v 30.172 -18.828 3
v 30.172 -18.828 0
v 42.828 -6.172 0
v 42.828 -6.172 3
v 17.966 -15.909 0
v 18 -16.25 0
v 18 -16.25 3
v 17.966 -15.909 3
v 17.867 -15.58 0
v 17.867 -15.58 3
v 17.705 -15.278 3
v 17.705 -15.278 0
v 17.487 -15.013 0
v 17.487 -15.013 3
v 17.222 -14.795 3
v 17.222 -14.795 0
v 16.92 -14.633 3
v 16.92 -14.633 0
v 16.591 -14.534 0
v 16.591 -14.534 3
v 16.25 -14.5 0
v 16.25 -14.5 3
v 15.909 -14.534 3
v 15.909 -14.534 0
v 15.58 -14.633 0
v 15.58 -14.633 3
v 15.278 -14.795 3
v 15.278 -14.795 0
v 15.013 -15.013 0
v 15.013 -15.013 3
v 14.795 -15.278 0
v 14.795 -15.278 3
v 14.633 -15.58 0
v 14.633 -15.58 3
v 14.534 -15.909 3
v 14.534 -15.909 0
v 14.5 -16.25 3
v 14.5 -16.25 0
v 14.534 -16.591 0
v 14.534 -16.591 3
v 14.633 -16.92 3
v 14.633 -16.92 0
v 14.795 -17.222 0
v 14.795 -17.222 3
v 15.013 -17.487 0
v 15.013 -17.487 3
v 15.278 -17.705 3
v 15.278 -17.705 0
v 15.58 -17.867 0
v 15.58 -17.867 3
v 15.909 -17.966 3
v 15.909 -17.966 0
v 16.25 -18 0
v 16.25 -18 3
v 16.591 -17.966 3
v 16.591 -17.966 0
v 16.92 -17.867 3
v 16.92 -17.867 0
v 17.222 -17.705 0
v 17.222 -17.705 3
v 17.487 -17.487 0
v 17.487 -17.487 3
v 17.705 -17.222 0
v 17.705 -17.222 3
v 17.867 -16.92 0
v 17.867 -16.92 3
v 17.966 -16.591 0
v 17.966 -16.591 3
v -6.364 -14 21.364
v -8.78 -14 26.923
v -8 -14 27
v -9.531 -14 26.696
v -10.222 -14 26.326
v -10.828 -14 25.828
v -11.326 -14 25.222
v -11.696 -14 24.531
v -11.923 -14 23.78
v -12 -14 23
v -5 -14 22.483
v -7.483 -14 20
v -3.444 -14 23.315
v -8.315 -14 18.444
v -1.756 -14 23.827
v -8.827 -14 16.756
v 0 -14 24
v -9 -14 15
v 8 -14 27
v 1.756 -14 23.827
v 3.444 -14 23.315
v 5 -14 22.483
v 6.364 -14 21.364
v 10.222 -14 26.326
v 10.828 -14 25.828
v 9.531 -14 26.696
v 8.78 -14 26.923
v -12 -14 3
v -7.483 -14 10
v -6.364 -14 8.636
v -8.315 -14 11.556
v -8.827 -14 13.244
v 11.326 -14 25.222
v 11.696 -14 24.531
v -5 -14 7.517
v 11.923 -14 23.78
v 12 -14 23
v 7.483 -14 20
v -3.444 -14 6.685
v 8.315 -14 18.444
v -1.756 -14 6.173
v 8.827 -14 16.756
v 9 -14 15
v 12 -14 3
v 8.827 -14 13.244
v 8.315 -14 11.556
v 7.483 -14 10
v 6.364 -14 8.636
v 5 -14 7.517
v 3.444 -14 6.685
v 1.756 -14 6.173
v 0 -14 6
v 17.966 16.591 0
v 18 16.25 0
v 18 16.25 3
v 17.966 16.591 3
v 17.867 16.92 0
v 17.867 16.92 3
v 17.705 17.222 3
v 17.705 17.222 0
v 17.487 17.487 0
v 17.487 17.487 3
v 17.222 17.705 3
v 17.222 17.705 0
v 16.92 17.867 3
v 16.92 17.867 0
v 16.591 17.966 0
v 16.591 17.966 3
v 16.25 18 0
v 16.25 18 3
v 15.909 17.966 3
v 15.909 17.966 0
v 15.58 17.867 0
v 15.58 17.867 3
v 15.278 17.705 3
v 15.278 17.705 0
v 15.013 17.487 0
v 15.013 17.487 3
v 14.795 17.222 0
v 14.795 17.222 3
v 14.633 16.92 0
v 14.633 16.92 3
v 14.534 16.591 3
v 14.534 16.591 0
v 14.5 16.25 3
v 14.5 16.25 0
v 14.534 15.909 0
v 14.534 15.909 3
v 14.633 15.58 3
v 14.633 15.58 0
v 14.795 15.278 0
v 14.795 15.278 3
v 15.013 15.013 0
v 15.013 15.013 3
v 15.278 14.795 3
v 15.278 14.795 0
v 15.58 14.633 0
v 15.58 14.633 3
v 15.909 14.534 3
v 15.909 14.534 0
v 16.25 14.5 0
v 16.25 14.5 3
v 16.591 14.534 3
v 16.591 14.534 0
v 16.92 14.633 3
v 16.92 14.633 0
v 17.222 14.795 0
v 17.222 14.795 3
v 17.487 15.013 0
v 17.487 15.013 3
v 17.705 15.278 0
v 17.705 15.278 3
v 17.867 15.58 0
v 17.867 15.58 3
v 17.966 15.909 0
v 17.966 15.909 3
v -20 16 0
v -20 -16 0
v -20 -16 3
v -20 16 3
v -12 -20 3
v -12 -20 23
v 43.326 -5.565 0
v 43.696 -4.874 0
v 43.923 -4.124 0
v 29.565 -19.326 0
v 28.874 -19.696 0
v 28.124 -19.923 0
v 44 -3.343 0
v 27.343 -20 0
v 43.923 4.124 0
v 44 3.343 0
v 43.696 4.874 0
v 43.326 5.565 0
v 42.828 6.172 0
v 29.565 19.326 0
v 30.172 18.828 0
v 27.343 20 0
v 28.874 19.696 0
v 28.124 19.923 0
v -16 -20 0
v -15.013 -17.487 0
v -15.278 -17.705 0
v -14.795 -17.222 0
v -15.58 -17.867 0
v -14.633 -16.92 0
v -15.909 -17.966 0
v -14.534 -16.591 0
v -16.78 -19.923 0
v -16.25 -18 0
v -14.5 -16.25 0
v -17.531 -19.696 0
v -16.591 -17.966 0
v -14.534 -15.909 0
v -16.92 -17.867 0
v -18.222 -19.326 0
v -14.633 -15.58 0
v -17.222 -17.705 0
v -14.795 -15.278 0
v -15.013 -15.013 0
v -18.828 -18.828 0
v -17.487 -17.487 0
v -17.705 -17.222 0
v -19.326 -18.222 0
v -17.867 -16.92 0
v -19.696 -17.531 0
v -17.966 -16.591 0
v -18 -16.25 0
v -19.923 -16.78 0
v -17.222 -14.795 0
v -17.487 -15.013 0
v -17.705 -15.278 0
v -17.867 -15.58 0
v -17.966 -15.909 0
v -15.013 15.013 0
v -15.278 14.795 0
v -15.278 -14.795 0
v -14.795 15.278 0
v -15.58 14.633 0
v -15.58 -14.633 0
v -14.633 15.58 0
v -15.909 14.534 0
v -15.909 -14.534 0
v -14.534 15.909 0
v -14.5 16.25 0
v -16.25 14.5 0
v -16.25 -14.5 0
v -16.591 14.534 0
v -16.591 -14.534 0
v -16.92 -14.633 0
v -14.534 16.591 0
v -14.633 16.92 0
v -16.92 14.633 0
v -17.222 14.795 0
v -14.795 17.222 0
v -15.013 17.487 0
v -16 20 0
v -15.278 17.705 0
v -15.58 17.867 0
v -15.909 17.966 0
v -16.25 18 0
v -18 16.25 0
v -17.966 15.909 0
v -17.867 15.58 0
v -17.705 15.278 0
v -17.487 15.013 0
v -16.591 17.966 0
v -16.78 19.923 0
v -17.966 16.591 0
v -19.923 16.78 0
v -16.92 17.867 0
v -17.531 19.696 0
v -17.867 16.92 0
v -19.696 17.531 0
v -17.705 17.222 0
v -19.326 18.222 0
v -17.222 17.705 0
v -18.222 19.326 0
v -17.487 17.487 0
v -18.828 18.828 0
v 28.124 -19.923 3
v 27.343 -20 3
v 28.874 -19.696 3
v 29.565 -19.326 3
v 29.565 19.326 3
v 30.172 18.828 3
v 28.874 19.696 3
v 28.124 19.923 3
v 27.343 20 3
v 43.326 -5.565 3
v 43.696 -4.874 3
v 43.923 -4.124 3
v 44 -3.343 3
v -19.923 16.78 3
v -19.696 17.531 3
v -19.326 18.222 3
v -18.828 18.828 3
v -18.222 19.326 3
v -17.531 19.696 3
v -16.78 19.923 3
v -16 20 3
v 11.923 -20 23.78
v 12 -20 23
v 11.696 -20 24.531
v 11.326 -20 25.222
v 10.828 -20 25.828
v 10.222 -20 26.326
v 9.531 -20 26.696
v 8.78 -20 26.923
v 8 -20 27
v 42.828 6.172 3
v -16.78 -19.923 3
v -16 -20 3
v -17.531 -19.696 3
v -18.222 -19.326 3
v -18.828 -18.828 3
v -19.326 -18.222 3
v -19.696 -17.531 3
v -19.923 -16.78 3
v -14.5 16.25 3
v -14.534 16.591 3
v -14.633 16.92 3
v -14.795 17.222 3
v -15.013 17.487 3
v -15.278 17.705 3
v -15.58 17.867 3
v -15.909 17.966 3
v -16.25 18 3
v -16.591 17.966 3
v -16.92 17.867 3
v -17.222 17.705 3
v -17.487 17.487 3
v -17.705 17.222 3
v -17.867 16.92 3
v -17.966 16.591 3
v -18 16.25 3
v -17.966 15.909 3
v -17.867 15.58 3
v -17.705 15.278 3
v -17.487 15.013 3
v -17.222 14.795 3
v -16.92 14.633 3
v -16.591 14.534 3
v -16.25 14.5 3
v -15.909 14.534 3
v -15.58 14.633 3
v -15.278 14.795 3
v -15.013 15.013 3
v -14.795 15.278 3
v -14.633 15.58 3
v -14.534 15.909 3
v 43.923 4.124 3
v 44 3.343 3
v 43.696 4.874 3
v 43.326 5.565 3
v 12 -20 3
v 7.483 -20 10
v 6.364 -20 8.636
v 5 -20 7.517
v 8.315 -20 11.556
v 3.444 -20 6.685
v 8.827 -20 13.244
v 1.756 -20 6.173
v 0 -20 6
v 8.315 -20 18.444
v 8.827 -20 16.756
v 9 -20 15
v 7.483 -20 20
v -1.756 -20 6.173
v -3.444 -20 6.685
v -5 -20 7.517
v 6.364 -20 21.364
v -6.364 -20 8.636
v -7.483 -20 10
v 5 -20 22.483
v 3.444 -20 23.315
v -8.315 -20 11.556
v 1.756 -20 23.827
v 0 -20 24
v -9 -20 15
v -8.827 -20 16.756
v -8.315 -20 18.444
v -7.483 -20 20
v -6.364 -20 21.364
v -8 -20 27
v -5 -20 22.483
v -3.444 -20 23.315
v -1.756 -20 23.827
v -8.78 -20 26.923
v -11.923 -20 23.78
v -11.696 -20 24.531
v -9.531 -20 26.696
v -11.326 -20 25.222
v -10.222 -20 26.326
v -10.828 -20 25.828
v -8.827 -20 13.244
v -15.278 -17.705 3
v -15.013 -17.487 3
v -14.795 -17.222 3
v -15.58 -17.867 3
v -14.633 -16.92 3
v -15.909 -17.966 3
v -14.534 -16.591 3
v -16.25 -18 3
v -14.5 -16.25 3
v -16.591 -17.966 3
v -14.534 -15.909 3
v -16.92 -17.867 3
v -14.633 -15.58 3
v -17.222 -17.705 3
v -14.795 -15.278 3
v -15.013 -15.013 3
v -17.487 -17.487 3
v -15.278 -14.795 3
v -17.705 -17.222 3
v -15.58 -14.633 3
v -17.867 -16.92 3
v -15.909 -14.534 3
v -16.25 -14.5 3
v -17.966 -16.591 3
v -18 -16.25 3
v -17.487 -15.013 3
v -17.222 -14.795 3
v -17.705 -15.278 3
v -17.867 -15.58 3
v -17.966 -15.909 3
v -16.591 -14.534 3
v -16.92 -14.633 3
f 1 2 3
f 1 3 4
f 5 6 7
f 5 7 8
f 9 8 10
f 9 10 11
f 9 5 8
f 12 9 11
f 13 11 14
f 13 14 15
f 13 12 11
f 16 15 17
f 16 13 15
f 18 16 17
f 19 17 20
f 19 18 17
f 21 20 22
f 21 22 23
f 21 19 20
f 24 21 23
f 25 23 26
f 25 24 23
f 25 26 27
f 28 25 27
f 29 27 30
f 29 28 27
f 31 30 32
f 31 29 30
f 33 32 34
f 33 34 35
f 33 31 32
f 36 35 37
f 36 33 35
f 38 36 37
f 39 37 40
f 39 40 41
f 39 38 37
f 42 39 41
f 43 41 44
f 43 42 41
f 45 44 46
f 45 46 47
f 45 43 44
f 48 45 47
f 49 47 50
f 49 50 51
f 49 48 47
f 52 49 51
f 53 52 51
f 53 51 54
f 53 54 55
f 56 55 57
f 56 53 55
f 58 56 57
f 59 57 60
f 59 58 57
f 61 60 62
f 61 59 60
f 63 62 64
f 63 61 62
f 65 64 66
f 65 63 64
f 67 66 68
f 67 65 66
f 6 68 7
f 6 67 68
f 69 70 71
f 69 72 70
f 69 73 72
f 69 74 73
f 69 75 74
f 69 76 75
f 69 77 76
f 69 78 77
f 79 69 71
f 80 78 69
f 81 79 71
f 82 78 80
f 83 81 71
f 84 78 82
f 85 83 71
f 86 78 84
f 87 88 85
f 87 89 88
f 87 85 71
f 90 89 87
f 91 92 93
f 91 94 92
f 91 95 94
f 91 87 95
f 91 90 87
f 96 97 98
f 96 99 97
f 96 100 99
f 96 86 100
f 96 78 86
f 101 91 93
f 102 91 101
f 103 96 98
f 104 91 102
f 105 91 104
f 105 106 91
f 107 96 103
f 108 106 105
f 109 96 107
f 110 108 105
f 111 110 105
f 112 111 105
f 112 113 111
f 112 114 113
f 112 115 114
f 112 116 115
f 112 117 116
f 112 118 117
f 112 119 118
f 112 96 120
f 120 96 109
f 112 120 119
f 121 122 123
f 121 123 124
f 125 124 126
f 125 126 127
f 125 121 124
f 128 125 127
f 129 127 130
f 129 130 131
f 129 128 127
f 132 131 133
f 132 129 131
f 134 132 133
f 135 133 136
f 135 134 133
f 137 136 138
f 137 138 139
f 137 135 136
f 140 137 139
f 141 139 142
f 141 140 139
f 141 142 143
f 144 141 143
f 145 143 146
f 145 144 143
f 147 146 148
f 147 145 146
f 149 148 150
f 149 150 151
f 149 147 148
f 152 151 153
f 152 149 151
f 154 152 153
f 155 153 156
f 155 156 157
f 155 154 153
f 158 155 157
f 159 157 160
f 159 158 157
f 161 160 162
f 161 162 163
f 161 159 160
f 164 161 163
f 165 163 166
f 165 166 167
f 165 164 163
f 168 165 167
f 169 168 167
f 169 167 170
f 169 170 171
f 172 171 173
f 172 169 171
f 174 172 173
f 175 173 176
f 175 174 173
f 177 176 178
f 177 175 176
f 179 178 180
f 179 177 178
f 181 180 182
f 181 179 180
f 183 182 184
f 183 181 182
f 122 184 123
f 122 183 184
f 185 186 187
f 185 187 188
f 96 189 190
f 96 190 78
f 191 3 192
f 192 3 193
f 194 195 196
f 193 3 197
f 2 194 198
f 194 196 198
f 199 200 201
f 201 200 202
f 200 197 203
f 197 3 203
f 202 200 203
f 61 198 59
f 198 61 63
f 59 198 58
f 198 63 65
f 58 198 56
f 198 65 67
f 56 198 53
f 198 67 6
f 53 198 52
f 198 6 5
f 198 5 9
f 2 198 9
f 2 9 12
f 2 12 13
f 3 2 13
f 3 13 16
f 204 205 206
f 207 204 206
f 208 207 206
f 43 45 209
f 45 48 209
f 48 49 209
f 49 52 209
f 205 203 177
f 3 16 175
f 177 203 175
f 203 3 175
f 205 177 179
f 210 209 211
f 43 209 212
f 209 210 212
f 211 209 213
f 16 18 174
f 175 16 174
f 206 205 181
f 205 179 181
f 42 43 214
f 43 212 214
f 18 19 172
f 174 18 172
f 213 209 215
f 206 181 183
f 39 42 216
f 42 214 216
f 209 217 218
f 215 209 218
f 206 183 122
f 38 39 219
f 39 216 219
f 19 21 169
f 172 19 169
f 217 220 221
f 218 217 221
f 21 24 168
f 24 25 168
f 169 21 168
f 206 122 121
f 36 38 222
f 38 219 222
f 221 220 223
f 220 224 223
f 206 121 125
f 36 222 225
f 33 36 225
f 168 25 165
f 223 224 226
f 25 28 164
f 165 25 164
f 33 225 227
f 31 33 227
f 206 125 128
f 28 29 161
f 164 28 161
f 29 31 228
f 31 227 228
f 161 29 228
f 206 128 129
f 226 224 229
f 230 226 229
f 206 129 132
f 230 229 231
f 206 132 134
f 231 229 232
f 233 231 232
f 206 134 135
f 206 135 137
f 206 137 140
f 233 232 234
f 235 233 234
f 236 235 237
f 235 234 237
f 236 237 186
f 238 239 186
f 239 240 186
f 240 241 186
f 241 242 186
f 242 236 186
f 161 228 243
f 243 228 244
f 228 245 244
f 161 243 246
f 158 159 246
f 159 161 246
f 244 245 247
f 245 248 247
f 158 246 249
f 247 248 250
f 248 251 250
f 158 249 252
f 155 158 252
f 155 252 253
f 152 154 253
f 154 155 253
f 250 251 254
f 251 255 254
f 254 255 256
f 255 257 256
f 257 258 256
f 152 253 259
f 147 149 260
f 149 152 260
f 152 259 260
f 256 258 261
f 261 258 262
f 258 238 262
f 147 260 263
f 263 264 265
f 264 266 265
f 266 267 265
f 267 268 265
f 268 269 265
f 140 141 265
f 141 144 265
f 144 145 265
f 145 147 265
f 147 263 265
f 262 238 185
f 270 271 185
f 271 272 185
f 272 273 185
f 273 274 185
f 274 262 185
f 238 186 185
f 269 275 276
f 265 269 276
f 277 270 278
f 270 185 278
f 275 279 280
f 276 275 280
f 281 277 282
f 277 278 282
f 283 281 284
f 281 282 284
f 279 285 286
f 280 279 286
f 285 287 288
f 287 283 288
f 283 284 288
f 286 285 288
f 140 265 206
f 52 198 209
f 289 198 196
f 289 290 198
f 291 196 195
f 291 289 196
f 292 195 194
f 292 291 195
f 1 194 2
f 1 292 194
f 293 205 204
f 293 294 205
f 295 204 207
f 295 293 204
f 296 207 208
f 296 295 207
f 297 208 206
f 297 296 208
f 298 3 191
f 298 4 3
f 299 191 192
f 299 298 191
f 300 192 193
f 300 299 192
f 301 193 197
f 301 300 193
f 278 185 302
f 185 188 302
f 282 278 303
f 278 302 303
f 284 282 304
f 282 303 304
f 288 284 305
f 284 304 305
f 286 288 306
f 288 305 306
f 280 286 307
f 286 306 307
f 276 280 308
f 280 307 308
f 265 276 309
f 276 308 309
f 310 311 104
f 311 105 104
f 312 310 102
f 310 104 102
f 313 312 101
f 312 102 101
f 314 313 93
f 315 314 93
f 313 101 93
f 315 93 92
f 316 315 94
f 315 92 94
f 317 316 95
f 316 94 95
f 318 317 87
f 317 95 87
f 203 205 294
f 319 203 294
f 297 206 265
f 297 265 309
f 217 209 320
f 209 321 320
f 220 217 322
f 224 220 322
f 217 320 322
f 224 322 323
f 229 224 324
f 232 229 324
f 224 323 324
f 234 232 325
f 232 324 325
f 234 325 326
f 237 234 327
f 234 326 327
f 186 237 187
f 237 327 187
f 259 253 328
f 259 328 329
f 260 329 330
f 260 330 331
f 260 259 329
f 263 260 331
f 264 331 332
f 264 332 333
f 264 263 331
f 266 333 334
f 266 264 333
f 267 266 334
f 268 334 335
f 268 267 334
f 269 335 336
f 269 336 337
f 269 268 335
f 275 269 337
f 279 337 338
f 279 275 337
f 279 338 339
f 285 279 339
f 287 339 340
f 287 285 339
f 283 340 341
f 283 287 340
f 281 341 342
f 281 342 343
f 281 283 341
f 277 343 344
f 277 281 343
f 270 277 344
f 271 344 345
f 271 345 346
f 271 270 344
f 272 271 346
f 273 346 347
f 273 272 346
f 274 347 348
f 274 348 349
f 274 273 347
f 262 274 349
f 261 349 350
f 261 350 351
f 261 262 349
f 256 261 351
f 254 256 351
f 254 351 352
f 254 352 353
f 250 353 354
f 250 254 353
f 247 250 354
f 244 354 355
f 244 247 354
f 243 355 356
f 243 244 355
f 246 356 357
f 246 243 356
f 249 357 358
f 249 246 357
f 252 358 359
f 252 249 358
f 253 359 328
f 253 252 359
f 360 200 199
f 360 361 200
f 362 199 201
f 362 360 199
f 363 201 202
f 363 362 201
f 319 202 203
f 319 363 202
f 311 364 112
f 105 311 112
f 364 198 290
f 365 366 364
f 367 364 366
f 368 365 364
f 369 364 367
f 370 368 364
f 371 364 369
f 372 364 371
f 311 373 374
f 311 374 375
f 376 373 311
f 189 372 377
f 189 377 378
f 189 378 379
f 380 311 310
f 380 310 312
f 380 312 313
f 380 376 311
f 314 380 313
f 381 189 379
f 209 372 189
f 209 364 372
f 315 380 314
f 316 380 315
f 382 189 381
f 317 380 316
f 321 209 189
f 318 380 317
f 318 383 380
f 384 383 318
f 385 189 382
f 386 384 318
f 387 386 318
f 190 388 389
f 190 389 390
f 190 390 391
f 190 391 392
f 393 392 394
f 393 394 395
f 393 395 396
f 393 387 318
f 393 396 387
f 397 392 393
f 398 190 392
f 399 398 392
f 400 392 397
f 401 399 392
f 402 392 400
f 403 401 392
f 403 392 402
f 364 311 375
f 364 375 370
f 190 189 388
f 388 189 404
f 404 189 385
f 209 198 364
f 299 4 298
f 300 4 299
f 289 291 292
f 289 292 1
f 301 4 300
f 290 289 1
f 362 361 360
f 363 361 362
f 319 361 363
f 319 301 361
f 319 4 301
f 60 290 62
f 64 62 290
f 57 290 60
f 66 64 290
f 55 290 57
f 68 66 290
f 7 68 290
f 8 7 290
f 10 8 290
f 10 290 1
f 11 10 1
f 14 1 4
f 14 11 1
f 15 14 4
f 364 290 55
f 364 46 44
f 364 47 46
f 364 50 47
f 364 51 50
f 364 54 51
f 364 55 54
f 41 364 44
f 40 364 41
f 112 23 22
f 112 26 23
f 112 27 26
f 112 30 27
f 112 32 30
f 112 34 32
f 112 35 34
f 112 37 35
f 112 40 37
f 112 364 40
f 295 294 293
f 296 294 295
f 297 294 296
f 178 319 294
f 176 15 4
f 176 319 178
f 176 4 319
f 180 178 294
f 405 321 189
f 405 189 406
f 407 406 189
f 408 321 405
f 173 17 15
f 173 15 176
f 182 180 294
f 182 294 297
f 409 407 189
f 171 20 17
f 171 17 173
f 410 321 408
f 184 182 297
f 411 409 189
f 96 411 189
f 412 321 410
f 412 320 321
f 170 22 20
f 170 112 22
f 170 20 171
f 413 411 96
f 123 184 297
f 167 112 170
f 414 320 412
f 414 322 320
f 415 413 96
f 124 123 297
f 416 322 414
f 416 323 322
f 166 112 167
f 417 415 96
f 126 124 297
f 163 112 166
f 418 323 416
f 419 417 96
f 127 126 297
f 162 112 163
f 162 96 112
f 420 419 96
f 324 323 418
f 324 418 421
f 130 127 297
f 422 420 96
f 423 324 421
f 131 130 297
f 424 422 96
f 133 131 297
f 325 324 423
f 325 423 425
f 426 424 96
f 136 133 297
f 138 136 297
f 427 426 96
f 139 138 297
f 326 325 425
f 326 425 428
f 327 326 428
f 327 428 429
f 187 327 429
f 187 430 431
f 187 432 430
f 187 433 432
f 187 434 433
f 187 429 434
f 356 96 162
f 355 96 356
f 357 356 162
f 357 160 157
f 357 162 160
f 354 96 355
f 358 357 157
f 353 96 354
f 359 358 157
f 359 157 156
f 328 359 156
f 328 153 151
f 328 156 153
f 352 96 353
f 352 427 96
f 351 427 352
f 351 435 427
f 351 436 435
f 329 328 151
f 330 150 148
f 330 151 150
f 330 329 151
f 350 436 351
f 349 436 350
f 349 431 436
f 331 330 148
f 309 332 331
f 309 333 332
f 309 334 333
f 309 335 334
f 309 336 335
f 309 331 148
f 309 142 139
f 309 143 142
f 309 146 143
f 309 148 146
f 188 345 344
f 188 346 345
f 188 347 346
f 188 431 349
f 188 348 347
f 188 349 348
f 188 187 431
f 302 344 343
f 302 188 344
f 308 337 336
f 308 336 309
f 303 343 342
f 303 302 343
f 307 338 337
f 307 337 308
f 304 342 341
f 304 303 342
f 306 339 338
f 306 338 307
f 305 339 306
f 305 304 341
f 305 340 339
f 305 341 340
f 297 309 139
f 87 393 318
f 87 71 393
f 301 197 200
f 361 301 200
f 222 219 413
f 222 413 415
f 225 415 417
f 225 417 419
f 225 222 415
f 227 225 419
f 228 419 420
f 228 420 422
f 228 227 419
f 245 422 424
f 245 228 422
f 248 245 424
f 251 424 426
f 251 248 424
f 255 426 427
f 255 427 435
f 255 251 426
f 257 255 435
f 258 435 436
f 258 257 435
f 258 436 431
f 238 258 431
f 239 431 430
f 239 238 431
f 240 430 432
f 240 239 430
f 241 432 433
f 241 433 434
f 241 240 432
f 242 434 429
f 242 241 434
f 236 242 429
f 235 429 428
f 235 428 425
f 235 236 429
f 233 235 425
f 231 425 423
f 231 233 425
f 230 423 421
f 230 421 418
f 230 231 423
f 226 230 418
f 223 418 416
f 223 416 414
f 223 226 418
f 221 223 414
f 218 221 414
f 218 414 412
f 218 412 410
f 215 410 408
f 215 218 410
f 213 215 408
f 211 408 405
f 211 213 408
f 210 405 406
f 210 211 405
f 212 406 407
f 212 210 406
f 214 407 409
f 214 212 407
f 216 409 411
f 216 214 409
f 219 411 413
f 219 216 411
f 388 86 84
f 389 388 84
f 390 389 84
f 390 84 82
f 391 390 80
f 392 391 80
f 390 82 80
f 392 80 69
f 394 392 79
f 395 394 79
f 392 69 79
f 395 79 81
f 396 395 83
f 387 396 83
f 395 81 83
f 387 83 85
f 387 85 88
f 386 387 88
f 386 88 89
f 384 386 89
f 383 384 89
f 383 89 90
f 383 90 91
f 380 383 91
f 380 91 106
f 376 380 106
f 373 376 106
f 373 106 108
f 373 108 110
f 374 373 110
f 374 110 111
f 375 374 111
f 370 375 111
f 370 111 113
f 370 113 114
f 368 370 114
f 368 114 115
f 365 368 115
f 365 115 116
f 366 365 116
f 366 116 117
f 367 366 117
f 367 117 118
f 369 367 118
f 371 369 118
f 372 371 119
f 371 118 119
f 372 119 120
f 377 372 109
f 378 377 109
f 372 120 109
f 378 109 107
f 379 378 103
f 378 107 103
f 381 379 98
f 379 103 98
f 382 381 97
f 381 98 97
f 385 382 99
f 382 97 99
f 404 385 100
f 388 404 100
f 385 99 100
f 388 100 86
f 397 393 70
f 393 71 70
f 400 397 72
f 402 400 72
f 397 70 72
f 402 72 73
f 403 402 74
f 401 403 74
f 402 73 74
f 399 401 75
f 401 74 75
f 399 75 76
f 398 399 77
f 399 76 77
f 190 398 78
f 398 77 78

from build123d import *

# Parameters (mm, degrees)
F0_W     = 40
F0_H     = 40
F0_R     = 1.75
F1_DEPTH = 3
F2_W     = 24
F2_H     = 6
F3_DEPTH = 24
F4_R     = 9
F5_DEPTH = 25
F6_DEPTH = 24
F7_SIZE  = 15
F8_R     = 4


with BuildPart() as f1:
    # F0 (on Top) → F1 (new body)
    with BuildSketch(Plane.XY):
        Rectangle(F0_W, F0_H)
        with Locations((-16.25, -16.25)):
            Circle(F0_R, mode=Mode.SUBTRACT)
        with Locations((16.25, -16.25)):
            Circle(F0_R, mode=Mode.SUBTRACT)
        with Locations((-16.25, 16.25)):
            Circle(F0_R, mode=Mode.SUBTRACT)
        with Locations((16.25, 16.25)):
            Circle(F0_R, mode=Mode.SUBTRACT)
    extrude(amount=F1_DEPTH)

    # F2 (on face) → F3 (join)
    with BuildSketch(Plane.XY.offset(3)):
        with Locations((0, -17)):
            Rectangle(F2_W, F2_H)
    extrude(amount=F3_DEPTH)

    # F4 (on face) → F5 (cut)
    with BuildSketch(Plane(origin=(0, -14, 0), x_dir=(-1, 0, 0), z_dir=(0, 1, 0))):
        with Locations((0, 15)):
            Circle(F4_R)
    extrude(amount=-F5_DEPTH, mode=Mode.SUBTRACT)

    # F6 (add): a face of the model
    f6_faces = [f1.faces().sort_by_distance(p)[0] for p in [
        (20, 0, 1.5),
    ]]
    extrude(f6_faces, amount=F6_DEPTH)

    # F7
    f7_edges = [f1.edges().sort_by_distance(p)[0] for p in [
        (44, 20, 1.5),
        (44, -20, 1.5),
    ]]
    chamfer(f7_edges, length=F7_SIZE)

    # F8
    f8_edges = [f1.edges().sort_by_distance(p)[0] for p in [
        (29, 20, 1.5),
        (44, 5, 1.5),
        (-20, 20, 1.5),
        (-20, -20, 1.5),
        (29, -20, 1.5),
        (44, -5, 1.5),
        (-12, -17, 27),
        (12, -17, 27),
    ]]
    fillet(f8_edges, radius=F8_R)


solid = f1.part
